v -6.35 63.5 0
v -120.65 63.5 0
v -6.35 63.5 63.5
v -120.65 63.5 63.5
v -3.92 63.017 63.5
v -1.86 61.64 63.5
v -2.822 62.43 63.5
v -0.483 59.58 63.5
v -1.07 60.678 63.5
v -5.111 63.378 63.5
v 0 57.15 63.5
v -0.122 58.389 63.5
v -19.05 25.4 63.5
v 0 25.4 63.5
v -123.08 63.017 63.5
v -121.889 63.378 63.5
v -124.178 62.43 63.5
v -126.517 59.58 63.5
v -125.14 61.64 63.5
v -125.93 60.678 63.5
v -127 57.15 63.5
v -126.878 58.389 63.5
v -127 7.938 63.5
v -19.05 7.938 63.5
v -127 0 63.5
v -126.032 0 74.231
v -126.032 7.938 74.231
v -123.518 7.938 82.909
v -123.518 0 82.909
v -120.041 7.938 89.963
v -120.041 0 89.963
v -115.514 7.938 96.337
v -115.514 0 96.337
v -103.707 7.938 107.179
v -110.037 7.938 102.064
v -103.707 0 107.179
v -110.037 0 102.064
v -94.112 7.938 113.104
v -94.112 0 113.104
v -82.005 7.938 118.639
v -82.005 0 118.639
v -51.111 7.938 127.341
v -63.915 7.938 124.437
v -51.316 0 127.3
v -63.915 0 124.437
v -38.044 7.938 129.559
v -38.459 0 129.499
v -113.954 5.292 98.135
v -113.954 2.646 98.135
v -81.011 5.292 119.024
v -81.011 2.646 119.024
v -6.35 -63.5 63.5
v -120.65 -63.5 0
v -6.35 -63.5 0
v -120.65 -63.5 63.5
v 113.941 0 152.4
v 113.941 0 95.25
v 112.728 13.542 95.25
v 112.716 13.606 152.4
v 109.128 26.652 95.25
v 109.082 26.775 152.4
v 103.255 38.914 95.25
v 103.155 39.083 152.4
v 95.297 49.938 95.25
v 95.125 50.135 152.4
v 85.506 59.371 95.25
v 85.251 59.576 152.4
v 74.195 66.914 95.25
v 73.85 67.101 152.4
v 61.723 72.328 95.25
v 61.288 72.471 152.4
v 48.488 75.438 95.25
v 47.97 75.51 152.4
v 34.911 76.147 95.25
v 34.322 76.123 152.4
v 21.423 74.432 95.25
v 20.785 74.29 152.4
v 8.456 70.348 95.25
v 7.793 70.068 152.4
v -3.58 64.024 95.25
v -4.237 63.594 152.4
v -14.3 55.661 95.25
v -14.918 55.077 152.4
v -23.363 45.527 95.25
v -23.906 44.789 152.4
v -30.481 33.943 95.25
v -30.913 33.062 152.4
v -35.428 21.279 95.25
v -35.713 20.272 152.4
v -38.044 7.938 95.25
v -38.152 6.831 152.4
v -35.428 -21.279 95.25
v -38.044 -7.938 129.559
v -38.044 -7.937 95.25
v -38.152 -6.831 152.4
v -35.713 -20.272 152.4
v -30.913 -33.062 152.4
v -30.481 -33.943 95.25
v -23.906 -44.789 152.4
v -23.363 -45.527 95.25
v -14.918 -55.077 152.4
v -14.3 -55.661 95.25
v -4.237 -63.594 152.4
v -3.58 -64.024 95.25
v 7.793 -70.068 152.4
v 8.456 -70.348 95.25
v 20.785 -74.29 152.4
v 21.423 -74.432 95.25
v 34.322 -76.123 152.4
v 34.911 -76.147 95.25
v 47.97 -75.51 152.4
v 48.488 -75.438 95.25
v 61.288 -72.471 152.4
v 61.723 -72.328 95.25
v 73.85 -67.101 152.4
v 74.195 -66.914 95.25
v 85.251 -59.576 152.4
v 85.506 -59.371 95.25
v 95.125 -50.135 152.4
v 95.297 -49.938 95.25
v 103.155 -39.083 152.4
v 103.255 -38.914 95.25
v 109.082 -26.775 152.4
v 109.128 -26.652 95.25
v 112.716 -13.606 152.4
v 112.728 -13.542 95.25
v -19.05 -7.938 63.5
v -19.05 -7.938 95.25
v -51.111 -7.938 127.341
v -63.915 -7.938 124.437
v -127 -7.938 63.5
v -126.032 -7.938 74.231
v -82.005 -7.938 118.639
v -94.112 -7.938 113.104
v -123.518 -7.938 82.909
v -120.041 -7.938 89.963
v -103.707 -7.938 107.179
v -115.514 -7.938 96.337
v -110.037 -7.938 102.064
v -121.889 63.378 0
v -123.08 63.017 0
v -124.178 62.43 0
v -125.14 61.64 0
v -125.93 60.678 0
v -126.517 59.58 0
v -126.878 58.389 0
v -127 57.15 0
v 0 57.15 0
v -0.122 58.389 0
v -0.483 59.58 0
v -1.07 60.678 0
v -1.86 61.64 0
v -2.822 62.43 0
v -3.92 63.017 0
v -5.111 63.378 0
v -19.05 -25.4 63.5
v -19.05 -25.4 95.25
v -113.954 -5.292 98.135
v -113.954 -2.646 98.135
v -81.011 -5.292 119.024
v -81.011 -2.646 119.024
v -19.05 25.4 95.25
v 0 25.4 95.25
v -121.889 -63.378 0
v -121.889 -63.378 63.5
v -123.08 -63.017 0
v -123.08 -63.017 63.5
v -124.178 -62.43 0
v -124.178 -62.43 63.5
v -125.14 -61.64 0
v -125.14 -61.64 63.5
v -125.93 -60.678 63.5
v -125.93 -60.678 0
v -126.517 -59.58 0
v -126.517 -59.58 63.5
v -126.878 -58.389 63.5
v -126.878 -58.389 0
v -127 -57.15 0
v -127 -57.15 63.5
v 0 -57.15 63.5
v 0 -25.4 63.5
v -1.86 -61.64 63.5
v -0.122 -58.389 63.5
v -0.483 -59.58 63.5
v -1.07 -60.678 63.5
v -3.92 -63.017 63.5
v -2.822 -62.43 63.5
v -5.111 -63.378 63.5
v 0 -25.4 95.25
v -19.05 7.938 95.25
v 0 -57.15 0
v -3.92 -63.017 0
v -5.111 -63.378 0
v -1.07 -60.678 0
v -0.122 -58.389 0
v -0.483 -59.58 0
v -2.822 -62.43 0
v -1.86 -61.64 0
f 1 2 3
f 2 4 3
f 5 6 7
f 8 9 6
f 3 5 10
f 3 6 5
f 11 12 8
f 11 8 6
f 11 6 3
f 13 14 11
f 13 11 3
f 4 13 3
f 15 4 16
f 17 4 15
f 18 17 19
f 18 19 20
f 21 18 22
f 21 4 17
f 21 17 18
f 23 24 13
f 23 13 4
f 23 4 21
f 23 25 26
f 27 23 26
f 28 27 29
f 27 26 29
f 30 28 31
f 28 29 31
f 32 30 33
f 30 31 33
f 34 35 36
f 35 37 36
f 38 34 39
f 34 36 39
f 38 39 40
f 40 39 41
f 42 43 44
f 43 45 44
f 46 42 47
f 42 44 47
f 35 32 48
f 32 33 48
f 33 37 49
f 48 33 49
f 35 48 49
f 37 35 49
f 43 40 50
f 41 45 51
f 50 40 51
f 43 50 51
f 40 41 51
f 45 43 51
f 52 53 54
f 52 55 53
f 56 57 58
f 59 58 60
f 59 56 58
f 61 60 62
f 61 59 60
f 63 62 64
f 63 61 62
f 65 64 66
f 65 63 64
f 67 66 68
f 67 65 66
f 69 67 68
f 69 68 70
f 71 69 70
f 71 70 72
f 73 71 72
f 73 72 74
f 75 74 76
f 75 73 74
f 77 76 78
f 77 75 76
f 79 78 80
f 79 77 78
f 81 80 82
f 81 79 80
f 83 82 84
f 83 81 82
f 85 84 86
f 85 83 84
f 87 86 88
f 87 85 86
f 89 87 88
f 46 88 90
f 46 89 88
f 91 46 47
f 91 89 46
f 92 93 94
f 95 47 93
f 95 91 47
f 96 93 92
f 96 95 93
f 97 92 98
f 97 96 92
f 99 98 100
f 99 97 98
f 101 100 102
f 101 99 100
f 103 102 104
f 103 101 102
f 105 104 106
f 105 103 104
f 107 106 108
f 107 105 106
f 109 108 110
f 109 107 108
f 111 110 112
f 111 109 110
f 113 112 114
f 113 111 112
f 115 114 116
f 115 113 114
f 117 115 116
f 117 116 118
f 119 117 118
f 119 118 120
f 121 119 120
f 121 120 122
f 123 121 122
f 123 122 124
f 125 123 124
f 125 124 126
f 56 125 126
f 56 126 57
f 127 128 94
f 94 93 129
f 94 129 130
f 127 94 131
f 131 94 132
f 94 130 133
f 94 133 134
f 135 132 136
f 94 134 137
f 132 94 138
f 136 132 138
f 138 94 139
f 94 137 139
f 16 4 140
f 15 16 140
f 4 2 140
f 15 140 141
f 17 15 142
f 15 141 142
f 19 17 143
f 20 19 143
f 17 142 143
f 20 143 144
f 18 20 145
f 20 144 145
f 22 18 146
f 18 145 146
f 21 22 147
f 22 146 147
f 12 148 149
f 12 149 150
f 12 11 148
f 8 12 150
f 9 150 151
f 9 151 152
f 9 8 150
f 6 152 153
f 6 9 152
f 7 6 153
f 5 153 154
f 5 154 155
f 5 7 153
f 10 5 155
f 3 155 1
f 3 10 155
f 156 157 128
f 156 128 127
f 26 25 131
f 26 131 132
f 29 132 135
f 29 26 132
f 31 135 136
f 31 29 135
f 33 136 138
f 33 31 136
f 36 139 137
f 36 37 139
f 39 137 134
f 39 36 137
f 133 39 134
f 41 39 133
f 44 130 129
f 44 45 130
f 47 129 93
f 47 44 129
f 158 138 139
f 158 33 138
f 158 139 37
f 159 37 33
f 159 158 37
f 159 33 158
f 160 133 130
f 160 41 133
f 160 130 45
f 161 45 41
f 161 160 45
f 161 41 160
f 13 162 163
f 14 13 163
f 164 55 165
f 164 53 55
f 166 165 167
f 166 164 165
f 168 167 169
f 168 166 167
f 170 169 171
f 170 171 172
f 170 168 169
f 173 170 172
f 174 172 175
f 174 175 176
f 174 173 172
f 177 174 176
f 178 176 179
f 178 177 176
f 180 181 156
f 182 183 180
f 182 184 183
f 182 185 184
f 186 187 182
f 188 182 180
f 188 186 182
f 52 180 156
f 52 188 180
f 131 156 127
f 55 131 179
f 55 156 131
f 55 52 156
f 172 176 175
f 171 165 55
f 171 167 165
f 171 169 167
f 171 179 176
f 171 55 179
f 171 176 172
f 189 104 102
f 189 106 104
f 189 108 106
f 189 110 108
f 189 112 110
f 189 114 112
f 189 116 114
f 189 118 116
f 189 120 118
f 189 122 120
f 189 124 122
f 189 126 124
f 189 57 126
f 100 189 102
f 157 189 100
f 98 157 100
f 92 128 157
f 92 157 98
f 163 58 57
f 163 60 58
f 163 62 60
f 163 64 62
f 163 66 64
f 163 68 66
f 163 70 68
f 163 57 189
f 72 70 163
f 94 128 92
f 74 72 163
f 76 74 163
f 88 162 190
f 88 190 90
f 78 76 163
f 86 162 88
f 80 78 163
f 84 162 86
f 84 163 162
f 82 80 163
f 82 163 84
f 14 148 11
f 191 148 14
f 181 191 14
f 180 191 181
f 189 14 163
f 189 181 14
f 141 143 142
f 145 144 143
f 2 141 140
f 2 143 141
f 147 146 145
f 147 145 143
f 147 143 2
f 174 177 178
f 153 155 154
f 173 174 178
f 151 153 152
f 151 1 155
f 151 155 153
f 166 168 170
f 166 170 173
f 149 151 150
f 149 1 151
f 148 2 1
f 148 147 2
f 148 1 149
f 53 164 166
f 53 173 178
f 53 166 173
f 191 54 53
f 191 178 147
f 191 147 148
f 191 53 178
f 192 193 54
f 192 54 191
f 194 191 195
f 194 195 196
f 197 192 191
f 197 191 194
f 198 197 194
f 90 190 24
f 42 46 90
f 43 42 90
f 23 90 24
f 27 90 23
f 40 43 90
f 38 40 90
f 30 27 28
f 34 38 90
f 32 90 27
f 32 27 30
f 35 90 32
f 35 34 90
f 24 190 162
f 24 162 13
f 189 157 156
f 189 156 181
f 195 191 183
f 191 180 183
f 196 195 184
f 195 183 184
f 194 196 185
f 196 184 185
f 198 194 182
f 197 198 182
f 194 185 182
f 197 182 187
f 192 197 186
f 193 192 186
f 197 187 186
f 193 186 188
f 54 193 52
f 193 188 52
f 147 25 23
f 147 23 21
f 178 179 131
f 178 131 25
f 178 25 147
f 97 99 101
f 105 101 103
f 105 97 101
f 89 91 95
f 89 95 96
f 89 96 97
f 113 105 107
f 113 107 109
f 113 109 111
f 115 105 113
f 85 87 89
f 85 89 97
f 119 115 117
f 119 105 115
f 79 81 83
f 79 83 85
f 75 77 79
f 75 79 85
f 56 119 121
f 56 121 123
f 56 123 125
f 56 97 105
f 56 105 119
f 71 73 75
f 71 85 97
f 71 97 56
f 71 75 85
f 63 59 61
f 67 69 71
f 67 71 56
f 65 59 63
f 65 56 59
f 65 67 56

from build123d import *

# Parameters (mm, degrees)
F1_DEPTH = 63.5
F0_W     = 19.994952
F0_H     = 19.05
F2_DEPTH = 25.4
F3_DEPTH = 7.9375
F5_R     = 6.35


with BuildPart() as f1:
    # F0 (on Front) → F1 (new body, symmetric)
    with BuildSketch(Plane.XZ):
        Polygon((-127, 0), (0, 0), (0, 63.5), (-19.05, 63.5), (-127, 63.5), align=None)
    extrude(amount=F1_DEPTH, both=True)

    # F0 (on Front) → F2 (join, symmetric)
    with BuildSketch(Plane.XZ):
        with BuildLine():
            Line((-19.05, 63.5), (0, 63.5))
            Line((0, 63.5), (0, 98.425))
            ThreePointArc((0, 98.425), (4.64968, 109.65032), (15.875, 114.3))
            Line((15.875, 114.3), (37.741059, 114.3))
            Line((37.741059, 114.3), (37.741059, 133.35))
            Line((37.741059, 133.35), (15.875, 133.35))
            add(Edge.make_bspline(
                [(15.151937, 133.342514), (15.39375, 133.34518), (15.634775, 133.347673), (15.875, 133.35)],
                knots=[158.307474, 158.307474, 158.307474, 158.307474, 159.035493, 159.035493, 159.035493, 159.035493], degree=3))
            ThreePointArc((15.151937, 133.342514), (-9.075036, 122.863726), (-19.05, 98.425))
            Line((-19.05, 98.425), (-19.05, 63.5))
        make_face()
        with Locations((47.738535, 123.825)):
            Rectangle(F0_W, F0_H)
    extrude(amount=F2_DEPTH, both=True)

    # F0 (on Front) → F3 (join, symmetric)
    with BuildSketch(Plane.XZ):
        with BuildLine():
            add(Edge.make_bspline(
                [(-127, 63.5), (-127.275289, 124.073074), (-37.430264, 132.762938), (15.151937, 133.342514)],
                knots=[0, 0, 0, 0, 158.307474, 158.307474, 158.307474, 158.307474], degree=3))
            Line((-127, 63.5), (-19.05, 63.5))
            Line((-19.05, 63.5), (-19.05, 98.425))
            ThreePointArc((-19.05, 98.425), (-9.075036, 122.863726), (15.151937, 133.342514))
        make_face()
    extrude(amount=F3_DEPTH, both=True)

    # F0 (on Front) → F4 (revolve)
    with BuildSketch(Plane.XZ):
        Polygon((57.736011, 114.3), (37.741059, 114.3), (37.741059, 95.25), (113.941059, 95.25), (113.941059, 152.4), (37.741059, 152.4), (37.741059, 133.35), (57.736011, 133.35), align=None)
    revolve(axis=Axis((37.741059, 0, 123.825), (0, 0, 1)))

    # F5
    f5_edges = [f1.edges().sort_by_distance(p)[0] for p in [
        (-127, -63.5, 31.75),
        (0, -63.5, 31.75),
        (-127, 63.5, 31.75),
        (0, 63.5, 31.75),
    ]]
    fillet(f5_edges, radius=F5_R)


solid = f1.part
